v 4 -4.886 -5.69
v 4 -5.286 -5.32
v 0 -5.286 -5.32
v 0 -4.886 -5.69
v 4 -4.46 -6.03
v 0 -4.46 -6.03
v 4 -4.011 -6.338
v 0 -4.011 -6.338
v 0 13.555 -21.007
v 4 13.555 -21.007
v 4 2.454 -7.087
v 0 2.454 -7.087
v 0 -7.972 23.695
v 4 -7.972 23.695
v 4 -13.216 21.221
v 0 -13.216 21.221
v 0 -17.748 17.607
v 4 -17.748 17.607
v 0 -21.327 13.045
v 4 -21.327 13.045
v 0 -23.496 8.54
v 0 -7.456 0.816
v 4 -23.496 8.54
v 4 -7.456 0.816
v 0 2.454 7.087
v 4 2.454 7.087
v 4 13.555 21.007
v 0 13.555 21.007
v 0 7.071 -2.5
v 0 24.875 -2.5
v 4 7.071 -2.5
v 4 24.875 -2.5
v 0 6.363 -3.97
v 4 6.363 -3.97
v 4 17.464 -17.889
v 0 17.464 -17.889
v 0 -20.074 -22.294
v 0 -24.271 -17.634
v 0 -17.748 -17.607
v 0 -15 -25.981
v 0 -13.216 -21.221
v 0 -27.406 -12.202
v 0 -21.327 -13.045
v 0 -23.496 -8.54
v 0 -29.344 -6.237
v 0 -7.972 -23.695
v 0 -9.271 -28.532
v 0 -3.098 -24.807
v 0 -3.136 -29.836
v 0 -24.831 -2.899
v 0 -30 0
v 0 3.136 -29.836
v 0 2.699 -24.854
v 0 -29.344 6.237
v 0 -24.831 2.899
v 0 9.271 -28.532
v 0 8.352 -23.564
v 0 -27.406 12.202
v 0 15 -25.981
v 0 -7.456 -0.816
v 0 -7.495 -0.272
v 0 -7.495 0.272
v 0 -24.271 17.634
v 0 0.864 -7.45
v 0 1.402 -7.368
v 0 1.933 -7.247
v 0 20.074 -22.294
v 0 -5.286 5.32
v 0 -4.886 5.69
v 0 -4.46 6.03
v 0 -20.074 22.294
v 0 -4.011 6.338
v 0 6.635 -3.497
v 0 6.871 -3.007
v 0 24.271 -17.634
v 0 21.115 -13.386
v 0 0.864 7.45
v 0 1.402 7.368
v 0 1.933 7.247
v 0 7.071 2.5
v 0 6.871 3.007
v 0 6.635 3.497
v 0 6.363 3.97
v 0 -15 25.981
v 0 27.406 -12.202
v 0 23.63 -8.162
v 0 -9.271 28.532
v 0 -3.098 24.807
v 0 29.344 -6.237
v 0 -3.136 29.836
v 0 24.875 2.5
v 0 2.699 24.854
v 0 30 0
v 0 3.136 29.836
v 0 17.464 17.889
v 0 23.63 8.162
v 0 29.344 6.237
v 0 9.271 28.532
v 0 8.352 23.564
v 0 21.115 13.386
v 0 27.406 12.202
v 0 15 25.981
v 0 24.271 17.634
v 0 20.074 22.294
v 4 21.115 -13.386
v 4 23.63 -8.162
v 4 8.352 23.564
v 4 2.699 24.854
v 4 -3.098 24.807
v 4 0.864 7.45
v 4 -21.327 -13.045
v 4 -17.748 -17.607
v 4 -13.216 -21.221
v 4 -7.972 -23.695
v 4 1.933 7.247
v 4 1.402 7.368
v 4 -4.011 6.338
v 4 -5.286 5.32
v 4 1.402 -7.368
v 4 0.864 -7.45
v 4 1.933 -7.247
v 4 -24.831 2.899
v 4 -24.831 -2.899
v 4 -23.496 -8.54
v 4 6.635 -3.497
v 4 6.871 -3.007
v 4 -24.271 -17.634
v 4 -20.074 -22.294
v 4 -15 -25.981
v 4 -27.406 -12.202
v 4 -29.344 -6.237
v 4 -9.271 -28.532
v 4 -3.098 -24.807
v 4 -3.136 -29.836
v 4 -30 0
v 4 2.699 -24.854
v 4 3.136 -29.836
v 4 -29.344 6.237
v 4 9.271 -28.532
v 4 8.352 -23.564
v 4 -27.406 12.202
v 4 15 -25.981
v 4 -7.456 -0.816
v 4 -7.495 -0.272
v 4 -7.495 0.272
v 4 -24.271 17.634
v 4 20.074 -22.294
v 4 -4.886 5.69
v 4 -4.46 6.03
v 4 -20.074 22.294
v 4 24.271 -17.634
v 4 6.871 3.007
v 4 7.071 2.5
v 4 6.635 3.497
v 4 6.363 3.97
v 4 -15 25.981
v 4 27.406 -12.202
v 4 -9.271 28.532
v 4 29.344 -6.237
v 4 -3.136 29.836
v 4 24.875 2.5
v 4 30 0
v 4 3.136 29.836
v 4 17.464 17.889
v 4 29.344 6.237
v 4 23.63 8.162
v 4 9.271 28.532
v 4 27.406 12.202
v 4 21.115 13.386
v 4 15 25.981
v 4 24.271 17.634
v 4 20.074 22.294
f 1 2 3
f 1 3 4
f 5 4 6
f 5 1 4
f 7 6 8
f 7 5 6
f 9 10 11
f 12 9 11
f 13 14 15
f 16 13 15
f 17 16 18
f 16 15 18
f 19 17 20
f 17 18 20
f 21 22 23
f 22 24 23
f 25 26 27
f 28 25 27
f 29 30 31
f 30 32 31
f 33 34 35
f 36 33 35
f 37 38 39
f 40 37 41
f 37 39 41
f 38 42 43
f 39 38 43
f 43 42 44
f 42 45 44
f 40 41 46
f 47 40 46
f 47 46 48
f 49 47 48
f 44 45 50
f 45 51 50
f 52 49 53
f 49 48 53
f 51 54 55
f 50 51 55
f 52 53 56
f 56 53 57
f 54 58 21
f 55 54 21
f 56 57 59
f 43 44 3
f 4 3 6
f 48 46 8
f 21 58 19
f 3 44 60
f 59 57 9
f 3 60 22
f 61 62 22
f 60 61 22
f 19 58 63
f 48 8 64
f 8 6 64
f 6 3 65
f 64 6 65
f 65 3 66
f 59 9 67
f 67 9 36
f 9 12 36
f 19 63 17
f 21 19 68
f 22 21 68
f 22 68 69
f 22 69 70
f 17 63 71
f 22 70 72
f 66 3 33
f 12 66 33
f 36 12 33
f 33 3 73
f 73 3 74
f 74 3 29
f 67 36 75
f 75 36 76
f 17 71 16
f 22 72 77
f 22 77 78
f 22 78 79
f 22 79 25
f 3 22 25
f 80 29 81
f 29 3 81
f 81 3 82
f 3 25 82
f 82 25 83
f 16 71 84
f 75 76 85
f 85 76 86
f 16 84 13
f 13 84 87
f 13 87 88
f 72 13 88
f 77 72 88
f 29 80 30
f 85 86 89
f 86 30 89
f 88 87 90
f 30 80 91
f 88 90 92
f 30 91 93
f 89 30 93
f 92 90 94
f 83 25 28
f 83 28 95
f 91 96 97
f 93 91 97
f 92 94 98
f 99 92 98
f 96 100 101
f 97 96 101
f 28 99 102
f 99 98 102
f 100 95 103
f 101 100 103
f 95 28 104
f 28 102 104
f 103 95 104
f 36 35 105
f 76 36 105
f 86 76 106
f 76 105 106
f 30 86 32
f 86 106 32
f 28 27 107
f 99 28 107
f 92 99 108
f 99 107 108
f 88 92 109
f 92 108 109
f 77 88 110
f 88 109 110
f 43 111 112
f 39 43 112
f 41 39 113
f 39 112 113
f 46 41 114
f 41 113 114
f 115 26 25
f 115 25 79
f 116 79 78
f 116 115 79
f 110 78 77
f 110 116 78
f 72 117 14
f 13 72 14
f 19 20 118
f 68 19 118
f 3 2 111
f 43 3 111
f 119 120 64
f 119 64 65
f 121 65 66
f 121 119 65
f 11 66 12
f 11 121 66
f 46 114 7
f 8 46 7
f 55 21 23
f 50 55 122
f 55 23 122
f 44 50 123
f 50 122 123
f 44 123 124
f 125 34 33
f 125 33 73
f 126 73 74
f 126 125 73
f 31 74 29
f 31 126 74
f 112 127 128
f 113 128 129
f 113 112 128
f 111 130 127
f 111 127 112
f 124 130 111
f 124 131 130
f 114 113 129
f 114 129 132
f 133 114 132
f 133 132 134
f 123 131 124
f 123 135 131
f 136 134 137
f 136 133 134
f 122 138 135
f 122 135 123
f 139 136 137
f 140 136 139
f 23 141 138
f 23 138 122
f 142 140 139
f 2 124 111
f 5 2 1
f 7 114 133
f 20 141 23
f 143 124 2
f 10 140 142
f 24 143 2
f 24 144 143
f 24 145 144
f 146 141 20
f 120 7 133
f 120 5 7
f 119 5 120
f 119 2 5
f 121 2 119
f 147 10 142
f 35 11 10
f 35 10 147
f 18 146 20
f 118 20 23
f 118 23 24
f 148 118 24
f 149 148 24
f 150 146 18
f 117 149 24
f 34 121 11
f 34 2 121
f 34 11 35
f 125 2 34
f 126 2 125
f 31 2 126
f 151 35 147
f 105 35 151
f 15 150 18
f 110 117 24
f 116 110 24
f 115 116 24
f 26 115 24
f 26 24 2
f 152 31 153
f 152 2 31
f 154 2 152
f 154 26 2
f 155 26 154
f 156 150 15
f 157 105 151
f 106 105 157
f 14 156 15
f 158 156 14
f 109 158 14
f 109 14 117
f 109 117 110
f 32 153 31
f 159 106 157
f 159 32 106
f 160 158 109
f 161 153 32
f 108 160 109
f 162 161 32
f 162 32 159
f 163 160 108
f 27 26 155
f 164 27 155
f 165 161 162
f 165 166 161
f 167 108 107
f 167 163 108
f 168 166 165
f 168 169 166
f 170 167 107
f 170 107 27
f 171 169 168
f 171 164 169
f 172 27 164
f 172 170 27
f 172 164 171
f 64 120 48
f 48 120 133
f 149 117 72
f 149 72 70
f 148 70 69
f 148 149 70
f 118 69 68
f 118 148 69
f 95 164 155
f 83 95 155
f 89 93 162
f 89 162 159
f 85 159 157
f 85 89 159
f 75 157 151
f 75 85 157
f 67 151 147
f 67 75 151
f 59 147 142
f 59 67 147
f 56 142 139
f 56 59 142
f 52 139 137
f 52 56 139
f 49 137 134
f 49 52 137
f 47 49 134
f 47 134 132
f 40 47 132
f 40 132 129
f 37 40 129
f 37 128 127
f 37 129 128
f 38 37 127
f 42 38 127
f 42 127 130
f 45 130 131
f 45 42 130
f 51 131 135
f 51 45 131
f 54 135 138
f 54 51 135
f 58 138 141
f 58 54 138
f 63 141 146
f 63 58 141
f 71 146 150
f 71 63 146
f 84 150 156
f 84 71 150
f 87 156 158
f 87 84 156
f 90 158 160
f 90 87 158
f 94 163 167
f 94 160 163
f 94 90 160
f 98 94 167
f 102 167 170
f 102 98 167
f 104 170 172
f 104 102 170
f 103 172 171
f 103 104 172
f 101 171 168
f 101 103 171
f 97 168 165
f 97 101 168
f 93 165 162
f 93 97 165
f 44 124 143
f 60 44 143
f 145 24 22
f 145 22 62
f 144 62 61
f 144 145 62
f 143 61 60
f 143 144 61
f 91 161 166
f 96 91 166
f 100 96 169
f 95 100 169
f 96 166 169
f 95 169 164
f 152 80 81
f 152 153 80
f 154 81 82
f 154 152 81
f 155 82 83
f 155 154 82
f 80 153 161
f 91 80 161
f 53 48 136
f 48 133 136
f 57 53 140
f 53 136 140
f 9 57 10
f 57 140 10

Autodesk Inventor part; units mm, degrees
ref_plane "YZ Plane" through (0, 0, 0) normal (1, 0, 0) x (0, 1, 0)
ref_plane "XZ Plane" through (0, 0, 0) normal (0, 1, 0) x (-1, 0, 0)
ref_plane "XY Plane" through (0, 0, 0) normal (0, 0, 1) x (1, 0, 0)
sketch "Sketch1" plane through (0, 0, 0) normal (1, 0, 0) x (0, 1, 0)
  circle A0 centre (0, 0) radius 30
  dimension "d228" = 60
extrude "Extrusion1" add sketch "Sketch1" along normal blind 4
sketch "Sketch3" plane through (4, 0, 0) normal (1, 0, 0) x (0, 0, -1)
  circle A0 centre (0, 0) radius 30 projected
  line L0 (-2.5, 25) -> (2.5, 25)
  line L1 (0, -42) -> (0, 42) projected
  circle A1 centre (0, 0) radius 7.5
  line L2 (2.5, 25) -> (2.5, 7.0711)
  line L3 (-2.5, 7.0711) -> (-2.5, 25)
  circle A2 centre (0, 0) radius 25
  line L4 (-17.9871, 17.5418) -> (-3.9697, 6.3633)
  line L5 (-21.1045, 13.6327) -> (-17.9871, 17.5418)
  line L6 (-7.0871, 2.4542) -> (-21.1045, 13.6327)
  line L7 (-24.9295, -3.1257) -> (-7.4501, 0.8639)
  line L8 (-23.8169, -8.0003) -> (-24.9295, -3.1257)
  line L9 (-6.3375, -4.0108) -> (-23.8169, -8.0003)
  line L10 (-13.0995, -21.4395) -> (-5.3204, -5.2861)
  line L11 (-8.5947, -23.6089) -> (-13.0995, -21.4395)
  line L12 (-0.8156, -7.4555) -> (-8.5947, -23.6089)
  line L13 (8.5947, -23.6089) -> (0.8156, -7.4555)
  line L14 (13.0995, -21.4395) -> (8.5947, -23.6089)
  line L15 (5.3204, -5.2861) -> (13.0995, -21.4395)
  line L16 (23.8169, -8.0003) -> (6.3375, -4.0108)
  line L17 (24.9295, -3.1257) -> (23.8169, -8.0003)
  line L18 (7.4501, 0.8639) -> (24.9295, -3.1257)
  line L19 (21.1045, 13.6327) -> (7.0871, 2.4542)
  line L20 (17.9871, 17.5418) -> (21.1045, 13.6327)
  line L21 (3.9697, 6.3633) -> (17.9871, 17.5418)
  point P0 (23.6947, -7.9725)
  point P1 (13.0451, -21.3266)
  point P2 (-8.5403, -23.496)
  point P3 (8.5403, -23.496)
  point P4 (0.8156, -7.4555)
  point P5 (-13.0451, -21.3266)
  point P6 (-23.6947, -7.9725)
  point P7 (-24.8073, -3.0978)
  point P8 (-7.4501, 0.8639)
  point P9 (-21.0065, 13.5545)
  point P10 (-17.8891, 17.4637)
  point P11 (-2.5, 24.8747)
  point P12 (17.8891, 17.4637)
  point P13 (2.5, 24.8747)
  point P14 (21.0065, 13.5545)
  point P15 (7.0871, 2.4542)
  point P16 (24.8073, -3.0978)
  dimension "d251" = 15
  dimension "d252" = 5
  dimension "d259" = 5
  dimension "d262" = 360
extrude "Extrusion2" cut sketch "Sketch3" against normal blind 4 contours A2 L12 A1 L1 | L1 A1 L13 A2 | A2 L21 A1 L2 | L3 A1 L4 A2 | L10 A2 L9 A1 | A1 L16 A2 L15 | L19 A2 L18 A1 | A1 L7 A2 L6
properties part number "Langbektang houder"
